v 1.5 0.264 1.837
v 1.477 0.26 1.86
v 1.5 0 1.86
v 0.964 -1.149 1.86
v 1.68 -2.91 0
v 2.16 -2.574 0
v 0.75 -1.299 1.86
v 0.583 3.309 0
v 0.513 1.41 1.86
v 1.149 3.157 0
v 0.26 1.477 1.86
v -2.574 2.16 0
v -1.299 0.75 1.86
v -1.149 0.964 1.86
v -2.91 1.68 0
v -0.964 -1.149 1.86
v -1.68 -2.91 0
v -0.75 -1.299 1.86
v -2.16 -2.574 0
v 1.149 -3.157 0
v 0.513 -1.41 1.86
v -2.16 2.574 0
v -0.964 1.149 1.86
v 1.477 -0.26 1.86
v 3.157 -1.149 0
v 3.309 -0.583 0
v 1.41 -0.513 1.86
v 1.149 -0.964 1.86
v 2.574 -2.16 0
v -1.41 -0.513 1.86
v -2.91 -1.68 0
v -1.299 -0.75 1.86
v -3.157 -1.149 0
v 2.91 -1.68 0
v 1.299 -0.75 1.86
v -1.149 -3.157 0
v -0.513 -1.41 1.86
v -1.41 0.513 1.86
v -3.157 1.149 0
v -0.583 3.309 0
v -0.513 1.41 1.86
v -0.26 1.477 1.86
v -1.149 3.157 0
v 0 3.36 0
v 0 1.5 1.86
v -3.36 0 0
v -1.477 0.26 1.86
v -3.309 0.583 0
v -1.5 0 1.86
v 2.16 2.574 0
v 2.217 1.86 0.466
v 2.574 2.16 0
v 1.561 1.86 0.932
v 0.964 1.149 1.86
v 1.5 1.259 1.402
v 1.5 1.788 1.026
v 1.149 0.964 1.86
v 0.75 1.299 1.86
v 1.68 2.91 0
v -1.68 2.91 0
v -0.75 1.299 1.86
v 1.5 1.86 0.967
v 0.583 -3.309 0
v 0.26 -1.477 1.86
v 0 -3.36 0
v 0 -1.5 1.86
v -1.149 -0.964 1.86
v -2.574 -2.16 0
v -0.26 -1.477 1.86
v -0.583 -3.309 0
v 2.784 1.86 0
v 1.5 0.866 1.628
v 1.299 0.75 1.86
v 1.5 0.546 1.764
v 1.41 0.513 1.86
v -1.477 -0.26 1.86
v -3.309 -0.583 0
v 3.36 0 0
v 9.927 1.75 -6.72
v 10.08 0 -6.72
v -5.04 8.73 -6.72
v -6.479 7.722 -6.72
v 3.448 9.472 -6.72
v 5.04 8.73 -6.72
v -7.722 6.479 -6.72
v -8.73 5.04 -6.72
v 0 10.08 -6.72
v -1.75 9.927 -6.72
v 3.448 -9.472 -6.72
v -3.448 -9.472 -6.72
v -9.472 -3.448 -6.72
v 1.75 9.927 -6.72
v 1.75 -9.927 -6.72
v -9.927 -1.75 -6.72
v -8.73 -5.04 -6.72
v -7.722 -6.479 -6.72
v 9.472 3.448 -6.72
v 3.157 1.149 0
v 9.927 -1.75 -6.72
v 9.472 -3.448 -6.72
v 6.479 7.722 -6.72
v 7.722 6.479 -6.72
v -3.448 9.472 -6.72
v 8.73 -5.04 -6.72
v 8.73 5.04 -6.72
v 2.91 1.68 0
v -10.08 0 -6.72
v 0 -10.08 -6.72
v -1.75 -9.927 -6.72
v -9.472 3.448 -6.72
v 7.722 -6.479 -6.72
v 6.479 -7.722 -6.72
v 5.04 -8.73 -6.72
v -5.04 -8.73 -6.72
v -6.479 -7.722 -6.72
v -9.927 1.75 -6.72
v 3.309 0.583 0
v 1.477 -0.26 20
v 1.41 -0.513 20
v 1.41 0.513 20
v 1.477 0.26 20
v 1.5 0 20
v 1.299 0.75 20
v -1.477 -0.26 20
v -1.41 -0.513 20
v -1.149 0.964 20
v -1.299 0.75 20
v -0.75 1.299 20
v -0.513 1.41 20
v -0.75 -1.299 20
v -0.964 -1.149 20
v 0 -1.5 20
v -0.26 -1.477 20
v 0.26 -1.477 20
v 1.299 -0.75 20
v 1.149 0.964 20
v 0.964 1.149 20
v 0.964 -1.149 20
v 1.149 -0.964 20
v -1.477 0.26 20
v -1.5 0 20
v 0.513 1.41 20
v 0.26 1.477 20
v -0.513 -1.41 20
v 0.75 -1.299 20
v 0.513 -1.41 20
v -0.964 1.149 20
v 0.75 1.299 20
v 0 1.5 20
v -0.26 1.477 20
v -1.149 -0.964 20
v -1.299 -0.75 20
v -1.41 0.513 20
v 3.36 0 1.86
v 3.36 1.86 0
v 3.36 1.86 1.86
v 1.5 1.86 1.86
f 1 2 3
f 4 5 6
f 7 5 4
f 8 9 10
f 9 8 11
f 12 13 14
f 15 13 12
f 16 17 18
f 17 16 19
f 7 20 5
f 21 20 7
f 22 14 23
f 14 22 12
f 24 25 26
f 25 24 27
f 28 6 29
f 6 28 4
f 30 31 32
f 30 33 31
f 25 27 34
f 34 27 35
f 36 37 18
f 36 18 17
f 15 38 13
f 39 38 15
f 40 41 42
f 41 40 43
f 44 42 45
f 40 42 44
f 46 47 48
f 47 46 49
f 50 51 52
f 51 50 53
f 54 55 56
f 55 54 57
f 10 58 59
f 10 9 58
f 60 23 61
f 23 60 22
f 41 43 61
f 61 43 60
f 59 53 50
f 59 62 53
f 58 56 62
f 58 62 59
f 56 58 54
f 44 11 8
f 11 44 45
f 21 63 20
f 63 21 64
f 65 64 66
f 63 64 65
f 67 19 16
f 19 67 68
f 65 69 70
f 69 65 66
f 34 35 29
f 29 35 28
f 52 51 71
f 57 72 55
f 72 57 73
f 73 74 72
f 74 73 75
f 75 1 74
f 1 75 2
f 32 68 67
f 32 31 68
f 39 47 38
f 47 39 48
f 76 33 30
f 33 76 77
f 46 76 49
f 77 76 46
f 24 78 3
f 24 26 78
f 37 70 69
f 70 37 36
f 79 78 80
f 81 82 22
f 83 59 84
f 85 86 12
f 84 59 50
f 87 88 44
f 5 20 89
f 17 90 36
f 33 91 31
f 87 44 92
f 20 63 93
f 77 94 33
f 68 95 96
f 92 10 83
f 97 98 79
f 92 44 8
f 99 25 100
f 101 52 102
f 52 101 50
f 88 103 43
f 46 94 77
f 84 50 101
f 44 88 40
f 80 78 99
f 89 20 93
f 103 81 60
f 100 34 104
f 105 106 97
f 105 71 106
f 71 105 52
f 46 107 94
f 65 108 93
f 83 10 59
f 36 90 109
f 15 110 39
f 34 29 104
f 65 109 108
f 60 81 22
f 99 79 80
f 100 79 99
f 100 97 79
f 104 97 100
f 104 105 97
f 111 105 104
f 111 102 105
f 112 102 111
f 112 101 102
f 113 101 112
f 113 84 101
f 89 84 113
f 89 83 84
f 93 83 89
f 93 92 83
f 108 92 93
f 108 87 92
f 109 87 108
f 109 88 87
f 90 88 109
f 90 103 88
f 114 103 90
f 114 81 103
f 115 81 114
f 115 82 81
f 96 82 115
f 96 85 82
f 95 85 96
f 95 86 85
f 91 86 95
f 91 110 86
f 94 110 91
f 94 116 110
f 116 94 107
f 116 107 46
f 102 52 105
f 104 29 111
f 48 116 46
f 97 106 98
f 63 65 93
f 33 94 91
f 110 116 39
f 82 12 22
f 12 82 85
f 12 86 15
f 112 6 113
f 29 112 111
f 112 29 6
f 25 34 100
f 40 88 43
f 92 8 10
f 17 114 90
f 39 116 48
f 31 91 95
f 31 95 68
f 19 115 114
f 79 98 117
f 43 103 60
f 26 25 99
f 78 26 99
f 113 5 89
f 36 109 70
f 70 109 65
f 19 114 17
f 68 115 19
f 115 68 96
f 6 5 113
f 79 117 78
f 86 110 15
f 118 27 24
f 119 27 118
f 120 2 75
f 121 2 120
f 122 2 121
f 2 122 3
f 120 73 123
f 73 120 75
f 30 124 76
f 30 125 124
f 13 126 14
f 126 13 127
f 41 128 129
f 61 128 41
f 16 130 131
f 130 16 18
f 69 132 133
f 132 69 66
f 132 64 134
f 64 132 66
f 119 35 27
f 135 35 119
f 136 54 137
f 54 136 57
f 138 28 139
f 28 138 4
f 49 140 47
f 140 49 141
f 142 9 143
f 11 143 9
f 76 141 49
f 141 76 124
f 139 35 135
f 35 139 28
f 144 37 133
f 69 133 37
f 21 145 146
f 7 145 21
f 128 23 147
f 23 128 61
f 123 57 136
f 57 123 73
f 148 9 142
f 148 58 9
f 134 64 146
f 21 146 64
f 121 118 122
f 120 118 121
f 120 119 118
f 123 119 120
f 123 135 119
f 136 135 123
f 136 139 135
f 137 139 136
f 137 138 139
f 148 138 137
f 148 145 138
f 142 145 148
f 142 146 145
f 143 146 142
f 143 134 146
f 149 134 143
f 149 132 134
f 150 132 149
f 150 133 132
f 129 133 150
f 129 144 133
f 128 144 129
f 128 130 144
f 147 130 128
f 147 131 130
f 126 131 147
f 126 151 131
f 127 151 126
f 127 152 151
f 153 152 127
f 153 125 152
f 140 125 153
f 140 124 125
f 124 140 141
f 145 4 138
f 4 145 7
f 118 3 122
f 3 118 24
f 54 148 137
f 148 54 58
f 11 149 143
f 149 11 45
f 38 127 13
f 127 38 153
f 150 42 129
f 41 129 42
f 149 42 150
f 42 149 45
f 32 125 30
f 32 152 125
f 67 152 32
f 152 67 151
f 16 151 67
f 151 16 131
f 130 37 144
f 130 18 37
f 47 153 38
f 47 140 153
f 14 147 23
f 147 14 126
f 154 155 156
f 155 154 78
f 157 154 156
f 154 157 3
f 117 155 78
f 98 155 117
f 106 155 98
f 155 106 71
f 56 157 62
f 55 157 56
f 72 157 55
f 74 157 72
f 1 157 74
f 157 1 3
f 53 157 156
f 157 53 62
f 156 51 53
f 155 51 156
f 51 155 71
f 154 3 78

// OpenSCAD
p2p3flatD=3;
p2p3flatHA=90;
p2p3flatHD=6.72;  //listed as 6.72 max 5.54 min
p2p3flatHH=1.86;


c2ID=400;
//AP=(p2p3flatHD/2)
//PB=p2p3flatHD/2
//CD=c2ID

echo(
"CP",
((c2ID+sqrt((-4*(p2p3flatHD/2)*(p2p3flatHD/2))+((c2ID)*(c2ID))))/2)

);

p2p3flatORmax=((c2ID+sqrt((-4*(p2p3flatHD/2)*(p2p3flatHD/2))+((c2ID)*(c2ID))))/2)/2; //maximum radius to be within c2ID

translate([0,0,0])
union(){
cylinder(d1=p2p3flatHD,d2=0,h=(p2p3flatHD/2)/tan(45),$fn=36);
translate([0,0,-(p2p3flatHD)/tan(45)])
cylinder(d1=p2p3flatHD*3,d2=p2p3flatHD,h=(p2p3flatHD)/tan(45),$fn=36);
cylinder(d=p2p3flatD,h=20,$fn=36);
}
translate([p2p3flatD/2,0,0])
cube(p2p3flatHH);
